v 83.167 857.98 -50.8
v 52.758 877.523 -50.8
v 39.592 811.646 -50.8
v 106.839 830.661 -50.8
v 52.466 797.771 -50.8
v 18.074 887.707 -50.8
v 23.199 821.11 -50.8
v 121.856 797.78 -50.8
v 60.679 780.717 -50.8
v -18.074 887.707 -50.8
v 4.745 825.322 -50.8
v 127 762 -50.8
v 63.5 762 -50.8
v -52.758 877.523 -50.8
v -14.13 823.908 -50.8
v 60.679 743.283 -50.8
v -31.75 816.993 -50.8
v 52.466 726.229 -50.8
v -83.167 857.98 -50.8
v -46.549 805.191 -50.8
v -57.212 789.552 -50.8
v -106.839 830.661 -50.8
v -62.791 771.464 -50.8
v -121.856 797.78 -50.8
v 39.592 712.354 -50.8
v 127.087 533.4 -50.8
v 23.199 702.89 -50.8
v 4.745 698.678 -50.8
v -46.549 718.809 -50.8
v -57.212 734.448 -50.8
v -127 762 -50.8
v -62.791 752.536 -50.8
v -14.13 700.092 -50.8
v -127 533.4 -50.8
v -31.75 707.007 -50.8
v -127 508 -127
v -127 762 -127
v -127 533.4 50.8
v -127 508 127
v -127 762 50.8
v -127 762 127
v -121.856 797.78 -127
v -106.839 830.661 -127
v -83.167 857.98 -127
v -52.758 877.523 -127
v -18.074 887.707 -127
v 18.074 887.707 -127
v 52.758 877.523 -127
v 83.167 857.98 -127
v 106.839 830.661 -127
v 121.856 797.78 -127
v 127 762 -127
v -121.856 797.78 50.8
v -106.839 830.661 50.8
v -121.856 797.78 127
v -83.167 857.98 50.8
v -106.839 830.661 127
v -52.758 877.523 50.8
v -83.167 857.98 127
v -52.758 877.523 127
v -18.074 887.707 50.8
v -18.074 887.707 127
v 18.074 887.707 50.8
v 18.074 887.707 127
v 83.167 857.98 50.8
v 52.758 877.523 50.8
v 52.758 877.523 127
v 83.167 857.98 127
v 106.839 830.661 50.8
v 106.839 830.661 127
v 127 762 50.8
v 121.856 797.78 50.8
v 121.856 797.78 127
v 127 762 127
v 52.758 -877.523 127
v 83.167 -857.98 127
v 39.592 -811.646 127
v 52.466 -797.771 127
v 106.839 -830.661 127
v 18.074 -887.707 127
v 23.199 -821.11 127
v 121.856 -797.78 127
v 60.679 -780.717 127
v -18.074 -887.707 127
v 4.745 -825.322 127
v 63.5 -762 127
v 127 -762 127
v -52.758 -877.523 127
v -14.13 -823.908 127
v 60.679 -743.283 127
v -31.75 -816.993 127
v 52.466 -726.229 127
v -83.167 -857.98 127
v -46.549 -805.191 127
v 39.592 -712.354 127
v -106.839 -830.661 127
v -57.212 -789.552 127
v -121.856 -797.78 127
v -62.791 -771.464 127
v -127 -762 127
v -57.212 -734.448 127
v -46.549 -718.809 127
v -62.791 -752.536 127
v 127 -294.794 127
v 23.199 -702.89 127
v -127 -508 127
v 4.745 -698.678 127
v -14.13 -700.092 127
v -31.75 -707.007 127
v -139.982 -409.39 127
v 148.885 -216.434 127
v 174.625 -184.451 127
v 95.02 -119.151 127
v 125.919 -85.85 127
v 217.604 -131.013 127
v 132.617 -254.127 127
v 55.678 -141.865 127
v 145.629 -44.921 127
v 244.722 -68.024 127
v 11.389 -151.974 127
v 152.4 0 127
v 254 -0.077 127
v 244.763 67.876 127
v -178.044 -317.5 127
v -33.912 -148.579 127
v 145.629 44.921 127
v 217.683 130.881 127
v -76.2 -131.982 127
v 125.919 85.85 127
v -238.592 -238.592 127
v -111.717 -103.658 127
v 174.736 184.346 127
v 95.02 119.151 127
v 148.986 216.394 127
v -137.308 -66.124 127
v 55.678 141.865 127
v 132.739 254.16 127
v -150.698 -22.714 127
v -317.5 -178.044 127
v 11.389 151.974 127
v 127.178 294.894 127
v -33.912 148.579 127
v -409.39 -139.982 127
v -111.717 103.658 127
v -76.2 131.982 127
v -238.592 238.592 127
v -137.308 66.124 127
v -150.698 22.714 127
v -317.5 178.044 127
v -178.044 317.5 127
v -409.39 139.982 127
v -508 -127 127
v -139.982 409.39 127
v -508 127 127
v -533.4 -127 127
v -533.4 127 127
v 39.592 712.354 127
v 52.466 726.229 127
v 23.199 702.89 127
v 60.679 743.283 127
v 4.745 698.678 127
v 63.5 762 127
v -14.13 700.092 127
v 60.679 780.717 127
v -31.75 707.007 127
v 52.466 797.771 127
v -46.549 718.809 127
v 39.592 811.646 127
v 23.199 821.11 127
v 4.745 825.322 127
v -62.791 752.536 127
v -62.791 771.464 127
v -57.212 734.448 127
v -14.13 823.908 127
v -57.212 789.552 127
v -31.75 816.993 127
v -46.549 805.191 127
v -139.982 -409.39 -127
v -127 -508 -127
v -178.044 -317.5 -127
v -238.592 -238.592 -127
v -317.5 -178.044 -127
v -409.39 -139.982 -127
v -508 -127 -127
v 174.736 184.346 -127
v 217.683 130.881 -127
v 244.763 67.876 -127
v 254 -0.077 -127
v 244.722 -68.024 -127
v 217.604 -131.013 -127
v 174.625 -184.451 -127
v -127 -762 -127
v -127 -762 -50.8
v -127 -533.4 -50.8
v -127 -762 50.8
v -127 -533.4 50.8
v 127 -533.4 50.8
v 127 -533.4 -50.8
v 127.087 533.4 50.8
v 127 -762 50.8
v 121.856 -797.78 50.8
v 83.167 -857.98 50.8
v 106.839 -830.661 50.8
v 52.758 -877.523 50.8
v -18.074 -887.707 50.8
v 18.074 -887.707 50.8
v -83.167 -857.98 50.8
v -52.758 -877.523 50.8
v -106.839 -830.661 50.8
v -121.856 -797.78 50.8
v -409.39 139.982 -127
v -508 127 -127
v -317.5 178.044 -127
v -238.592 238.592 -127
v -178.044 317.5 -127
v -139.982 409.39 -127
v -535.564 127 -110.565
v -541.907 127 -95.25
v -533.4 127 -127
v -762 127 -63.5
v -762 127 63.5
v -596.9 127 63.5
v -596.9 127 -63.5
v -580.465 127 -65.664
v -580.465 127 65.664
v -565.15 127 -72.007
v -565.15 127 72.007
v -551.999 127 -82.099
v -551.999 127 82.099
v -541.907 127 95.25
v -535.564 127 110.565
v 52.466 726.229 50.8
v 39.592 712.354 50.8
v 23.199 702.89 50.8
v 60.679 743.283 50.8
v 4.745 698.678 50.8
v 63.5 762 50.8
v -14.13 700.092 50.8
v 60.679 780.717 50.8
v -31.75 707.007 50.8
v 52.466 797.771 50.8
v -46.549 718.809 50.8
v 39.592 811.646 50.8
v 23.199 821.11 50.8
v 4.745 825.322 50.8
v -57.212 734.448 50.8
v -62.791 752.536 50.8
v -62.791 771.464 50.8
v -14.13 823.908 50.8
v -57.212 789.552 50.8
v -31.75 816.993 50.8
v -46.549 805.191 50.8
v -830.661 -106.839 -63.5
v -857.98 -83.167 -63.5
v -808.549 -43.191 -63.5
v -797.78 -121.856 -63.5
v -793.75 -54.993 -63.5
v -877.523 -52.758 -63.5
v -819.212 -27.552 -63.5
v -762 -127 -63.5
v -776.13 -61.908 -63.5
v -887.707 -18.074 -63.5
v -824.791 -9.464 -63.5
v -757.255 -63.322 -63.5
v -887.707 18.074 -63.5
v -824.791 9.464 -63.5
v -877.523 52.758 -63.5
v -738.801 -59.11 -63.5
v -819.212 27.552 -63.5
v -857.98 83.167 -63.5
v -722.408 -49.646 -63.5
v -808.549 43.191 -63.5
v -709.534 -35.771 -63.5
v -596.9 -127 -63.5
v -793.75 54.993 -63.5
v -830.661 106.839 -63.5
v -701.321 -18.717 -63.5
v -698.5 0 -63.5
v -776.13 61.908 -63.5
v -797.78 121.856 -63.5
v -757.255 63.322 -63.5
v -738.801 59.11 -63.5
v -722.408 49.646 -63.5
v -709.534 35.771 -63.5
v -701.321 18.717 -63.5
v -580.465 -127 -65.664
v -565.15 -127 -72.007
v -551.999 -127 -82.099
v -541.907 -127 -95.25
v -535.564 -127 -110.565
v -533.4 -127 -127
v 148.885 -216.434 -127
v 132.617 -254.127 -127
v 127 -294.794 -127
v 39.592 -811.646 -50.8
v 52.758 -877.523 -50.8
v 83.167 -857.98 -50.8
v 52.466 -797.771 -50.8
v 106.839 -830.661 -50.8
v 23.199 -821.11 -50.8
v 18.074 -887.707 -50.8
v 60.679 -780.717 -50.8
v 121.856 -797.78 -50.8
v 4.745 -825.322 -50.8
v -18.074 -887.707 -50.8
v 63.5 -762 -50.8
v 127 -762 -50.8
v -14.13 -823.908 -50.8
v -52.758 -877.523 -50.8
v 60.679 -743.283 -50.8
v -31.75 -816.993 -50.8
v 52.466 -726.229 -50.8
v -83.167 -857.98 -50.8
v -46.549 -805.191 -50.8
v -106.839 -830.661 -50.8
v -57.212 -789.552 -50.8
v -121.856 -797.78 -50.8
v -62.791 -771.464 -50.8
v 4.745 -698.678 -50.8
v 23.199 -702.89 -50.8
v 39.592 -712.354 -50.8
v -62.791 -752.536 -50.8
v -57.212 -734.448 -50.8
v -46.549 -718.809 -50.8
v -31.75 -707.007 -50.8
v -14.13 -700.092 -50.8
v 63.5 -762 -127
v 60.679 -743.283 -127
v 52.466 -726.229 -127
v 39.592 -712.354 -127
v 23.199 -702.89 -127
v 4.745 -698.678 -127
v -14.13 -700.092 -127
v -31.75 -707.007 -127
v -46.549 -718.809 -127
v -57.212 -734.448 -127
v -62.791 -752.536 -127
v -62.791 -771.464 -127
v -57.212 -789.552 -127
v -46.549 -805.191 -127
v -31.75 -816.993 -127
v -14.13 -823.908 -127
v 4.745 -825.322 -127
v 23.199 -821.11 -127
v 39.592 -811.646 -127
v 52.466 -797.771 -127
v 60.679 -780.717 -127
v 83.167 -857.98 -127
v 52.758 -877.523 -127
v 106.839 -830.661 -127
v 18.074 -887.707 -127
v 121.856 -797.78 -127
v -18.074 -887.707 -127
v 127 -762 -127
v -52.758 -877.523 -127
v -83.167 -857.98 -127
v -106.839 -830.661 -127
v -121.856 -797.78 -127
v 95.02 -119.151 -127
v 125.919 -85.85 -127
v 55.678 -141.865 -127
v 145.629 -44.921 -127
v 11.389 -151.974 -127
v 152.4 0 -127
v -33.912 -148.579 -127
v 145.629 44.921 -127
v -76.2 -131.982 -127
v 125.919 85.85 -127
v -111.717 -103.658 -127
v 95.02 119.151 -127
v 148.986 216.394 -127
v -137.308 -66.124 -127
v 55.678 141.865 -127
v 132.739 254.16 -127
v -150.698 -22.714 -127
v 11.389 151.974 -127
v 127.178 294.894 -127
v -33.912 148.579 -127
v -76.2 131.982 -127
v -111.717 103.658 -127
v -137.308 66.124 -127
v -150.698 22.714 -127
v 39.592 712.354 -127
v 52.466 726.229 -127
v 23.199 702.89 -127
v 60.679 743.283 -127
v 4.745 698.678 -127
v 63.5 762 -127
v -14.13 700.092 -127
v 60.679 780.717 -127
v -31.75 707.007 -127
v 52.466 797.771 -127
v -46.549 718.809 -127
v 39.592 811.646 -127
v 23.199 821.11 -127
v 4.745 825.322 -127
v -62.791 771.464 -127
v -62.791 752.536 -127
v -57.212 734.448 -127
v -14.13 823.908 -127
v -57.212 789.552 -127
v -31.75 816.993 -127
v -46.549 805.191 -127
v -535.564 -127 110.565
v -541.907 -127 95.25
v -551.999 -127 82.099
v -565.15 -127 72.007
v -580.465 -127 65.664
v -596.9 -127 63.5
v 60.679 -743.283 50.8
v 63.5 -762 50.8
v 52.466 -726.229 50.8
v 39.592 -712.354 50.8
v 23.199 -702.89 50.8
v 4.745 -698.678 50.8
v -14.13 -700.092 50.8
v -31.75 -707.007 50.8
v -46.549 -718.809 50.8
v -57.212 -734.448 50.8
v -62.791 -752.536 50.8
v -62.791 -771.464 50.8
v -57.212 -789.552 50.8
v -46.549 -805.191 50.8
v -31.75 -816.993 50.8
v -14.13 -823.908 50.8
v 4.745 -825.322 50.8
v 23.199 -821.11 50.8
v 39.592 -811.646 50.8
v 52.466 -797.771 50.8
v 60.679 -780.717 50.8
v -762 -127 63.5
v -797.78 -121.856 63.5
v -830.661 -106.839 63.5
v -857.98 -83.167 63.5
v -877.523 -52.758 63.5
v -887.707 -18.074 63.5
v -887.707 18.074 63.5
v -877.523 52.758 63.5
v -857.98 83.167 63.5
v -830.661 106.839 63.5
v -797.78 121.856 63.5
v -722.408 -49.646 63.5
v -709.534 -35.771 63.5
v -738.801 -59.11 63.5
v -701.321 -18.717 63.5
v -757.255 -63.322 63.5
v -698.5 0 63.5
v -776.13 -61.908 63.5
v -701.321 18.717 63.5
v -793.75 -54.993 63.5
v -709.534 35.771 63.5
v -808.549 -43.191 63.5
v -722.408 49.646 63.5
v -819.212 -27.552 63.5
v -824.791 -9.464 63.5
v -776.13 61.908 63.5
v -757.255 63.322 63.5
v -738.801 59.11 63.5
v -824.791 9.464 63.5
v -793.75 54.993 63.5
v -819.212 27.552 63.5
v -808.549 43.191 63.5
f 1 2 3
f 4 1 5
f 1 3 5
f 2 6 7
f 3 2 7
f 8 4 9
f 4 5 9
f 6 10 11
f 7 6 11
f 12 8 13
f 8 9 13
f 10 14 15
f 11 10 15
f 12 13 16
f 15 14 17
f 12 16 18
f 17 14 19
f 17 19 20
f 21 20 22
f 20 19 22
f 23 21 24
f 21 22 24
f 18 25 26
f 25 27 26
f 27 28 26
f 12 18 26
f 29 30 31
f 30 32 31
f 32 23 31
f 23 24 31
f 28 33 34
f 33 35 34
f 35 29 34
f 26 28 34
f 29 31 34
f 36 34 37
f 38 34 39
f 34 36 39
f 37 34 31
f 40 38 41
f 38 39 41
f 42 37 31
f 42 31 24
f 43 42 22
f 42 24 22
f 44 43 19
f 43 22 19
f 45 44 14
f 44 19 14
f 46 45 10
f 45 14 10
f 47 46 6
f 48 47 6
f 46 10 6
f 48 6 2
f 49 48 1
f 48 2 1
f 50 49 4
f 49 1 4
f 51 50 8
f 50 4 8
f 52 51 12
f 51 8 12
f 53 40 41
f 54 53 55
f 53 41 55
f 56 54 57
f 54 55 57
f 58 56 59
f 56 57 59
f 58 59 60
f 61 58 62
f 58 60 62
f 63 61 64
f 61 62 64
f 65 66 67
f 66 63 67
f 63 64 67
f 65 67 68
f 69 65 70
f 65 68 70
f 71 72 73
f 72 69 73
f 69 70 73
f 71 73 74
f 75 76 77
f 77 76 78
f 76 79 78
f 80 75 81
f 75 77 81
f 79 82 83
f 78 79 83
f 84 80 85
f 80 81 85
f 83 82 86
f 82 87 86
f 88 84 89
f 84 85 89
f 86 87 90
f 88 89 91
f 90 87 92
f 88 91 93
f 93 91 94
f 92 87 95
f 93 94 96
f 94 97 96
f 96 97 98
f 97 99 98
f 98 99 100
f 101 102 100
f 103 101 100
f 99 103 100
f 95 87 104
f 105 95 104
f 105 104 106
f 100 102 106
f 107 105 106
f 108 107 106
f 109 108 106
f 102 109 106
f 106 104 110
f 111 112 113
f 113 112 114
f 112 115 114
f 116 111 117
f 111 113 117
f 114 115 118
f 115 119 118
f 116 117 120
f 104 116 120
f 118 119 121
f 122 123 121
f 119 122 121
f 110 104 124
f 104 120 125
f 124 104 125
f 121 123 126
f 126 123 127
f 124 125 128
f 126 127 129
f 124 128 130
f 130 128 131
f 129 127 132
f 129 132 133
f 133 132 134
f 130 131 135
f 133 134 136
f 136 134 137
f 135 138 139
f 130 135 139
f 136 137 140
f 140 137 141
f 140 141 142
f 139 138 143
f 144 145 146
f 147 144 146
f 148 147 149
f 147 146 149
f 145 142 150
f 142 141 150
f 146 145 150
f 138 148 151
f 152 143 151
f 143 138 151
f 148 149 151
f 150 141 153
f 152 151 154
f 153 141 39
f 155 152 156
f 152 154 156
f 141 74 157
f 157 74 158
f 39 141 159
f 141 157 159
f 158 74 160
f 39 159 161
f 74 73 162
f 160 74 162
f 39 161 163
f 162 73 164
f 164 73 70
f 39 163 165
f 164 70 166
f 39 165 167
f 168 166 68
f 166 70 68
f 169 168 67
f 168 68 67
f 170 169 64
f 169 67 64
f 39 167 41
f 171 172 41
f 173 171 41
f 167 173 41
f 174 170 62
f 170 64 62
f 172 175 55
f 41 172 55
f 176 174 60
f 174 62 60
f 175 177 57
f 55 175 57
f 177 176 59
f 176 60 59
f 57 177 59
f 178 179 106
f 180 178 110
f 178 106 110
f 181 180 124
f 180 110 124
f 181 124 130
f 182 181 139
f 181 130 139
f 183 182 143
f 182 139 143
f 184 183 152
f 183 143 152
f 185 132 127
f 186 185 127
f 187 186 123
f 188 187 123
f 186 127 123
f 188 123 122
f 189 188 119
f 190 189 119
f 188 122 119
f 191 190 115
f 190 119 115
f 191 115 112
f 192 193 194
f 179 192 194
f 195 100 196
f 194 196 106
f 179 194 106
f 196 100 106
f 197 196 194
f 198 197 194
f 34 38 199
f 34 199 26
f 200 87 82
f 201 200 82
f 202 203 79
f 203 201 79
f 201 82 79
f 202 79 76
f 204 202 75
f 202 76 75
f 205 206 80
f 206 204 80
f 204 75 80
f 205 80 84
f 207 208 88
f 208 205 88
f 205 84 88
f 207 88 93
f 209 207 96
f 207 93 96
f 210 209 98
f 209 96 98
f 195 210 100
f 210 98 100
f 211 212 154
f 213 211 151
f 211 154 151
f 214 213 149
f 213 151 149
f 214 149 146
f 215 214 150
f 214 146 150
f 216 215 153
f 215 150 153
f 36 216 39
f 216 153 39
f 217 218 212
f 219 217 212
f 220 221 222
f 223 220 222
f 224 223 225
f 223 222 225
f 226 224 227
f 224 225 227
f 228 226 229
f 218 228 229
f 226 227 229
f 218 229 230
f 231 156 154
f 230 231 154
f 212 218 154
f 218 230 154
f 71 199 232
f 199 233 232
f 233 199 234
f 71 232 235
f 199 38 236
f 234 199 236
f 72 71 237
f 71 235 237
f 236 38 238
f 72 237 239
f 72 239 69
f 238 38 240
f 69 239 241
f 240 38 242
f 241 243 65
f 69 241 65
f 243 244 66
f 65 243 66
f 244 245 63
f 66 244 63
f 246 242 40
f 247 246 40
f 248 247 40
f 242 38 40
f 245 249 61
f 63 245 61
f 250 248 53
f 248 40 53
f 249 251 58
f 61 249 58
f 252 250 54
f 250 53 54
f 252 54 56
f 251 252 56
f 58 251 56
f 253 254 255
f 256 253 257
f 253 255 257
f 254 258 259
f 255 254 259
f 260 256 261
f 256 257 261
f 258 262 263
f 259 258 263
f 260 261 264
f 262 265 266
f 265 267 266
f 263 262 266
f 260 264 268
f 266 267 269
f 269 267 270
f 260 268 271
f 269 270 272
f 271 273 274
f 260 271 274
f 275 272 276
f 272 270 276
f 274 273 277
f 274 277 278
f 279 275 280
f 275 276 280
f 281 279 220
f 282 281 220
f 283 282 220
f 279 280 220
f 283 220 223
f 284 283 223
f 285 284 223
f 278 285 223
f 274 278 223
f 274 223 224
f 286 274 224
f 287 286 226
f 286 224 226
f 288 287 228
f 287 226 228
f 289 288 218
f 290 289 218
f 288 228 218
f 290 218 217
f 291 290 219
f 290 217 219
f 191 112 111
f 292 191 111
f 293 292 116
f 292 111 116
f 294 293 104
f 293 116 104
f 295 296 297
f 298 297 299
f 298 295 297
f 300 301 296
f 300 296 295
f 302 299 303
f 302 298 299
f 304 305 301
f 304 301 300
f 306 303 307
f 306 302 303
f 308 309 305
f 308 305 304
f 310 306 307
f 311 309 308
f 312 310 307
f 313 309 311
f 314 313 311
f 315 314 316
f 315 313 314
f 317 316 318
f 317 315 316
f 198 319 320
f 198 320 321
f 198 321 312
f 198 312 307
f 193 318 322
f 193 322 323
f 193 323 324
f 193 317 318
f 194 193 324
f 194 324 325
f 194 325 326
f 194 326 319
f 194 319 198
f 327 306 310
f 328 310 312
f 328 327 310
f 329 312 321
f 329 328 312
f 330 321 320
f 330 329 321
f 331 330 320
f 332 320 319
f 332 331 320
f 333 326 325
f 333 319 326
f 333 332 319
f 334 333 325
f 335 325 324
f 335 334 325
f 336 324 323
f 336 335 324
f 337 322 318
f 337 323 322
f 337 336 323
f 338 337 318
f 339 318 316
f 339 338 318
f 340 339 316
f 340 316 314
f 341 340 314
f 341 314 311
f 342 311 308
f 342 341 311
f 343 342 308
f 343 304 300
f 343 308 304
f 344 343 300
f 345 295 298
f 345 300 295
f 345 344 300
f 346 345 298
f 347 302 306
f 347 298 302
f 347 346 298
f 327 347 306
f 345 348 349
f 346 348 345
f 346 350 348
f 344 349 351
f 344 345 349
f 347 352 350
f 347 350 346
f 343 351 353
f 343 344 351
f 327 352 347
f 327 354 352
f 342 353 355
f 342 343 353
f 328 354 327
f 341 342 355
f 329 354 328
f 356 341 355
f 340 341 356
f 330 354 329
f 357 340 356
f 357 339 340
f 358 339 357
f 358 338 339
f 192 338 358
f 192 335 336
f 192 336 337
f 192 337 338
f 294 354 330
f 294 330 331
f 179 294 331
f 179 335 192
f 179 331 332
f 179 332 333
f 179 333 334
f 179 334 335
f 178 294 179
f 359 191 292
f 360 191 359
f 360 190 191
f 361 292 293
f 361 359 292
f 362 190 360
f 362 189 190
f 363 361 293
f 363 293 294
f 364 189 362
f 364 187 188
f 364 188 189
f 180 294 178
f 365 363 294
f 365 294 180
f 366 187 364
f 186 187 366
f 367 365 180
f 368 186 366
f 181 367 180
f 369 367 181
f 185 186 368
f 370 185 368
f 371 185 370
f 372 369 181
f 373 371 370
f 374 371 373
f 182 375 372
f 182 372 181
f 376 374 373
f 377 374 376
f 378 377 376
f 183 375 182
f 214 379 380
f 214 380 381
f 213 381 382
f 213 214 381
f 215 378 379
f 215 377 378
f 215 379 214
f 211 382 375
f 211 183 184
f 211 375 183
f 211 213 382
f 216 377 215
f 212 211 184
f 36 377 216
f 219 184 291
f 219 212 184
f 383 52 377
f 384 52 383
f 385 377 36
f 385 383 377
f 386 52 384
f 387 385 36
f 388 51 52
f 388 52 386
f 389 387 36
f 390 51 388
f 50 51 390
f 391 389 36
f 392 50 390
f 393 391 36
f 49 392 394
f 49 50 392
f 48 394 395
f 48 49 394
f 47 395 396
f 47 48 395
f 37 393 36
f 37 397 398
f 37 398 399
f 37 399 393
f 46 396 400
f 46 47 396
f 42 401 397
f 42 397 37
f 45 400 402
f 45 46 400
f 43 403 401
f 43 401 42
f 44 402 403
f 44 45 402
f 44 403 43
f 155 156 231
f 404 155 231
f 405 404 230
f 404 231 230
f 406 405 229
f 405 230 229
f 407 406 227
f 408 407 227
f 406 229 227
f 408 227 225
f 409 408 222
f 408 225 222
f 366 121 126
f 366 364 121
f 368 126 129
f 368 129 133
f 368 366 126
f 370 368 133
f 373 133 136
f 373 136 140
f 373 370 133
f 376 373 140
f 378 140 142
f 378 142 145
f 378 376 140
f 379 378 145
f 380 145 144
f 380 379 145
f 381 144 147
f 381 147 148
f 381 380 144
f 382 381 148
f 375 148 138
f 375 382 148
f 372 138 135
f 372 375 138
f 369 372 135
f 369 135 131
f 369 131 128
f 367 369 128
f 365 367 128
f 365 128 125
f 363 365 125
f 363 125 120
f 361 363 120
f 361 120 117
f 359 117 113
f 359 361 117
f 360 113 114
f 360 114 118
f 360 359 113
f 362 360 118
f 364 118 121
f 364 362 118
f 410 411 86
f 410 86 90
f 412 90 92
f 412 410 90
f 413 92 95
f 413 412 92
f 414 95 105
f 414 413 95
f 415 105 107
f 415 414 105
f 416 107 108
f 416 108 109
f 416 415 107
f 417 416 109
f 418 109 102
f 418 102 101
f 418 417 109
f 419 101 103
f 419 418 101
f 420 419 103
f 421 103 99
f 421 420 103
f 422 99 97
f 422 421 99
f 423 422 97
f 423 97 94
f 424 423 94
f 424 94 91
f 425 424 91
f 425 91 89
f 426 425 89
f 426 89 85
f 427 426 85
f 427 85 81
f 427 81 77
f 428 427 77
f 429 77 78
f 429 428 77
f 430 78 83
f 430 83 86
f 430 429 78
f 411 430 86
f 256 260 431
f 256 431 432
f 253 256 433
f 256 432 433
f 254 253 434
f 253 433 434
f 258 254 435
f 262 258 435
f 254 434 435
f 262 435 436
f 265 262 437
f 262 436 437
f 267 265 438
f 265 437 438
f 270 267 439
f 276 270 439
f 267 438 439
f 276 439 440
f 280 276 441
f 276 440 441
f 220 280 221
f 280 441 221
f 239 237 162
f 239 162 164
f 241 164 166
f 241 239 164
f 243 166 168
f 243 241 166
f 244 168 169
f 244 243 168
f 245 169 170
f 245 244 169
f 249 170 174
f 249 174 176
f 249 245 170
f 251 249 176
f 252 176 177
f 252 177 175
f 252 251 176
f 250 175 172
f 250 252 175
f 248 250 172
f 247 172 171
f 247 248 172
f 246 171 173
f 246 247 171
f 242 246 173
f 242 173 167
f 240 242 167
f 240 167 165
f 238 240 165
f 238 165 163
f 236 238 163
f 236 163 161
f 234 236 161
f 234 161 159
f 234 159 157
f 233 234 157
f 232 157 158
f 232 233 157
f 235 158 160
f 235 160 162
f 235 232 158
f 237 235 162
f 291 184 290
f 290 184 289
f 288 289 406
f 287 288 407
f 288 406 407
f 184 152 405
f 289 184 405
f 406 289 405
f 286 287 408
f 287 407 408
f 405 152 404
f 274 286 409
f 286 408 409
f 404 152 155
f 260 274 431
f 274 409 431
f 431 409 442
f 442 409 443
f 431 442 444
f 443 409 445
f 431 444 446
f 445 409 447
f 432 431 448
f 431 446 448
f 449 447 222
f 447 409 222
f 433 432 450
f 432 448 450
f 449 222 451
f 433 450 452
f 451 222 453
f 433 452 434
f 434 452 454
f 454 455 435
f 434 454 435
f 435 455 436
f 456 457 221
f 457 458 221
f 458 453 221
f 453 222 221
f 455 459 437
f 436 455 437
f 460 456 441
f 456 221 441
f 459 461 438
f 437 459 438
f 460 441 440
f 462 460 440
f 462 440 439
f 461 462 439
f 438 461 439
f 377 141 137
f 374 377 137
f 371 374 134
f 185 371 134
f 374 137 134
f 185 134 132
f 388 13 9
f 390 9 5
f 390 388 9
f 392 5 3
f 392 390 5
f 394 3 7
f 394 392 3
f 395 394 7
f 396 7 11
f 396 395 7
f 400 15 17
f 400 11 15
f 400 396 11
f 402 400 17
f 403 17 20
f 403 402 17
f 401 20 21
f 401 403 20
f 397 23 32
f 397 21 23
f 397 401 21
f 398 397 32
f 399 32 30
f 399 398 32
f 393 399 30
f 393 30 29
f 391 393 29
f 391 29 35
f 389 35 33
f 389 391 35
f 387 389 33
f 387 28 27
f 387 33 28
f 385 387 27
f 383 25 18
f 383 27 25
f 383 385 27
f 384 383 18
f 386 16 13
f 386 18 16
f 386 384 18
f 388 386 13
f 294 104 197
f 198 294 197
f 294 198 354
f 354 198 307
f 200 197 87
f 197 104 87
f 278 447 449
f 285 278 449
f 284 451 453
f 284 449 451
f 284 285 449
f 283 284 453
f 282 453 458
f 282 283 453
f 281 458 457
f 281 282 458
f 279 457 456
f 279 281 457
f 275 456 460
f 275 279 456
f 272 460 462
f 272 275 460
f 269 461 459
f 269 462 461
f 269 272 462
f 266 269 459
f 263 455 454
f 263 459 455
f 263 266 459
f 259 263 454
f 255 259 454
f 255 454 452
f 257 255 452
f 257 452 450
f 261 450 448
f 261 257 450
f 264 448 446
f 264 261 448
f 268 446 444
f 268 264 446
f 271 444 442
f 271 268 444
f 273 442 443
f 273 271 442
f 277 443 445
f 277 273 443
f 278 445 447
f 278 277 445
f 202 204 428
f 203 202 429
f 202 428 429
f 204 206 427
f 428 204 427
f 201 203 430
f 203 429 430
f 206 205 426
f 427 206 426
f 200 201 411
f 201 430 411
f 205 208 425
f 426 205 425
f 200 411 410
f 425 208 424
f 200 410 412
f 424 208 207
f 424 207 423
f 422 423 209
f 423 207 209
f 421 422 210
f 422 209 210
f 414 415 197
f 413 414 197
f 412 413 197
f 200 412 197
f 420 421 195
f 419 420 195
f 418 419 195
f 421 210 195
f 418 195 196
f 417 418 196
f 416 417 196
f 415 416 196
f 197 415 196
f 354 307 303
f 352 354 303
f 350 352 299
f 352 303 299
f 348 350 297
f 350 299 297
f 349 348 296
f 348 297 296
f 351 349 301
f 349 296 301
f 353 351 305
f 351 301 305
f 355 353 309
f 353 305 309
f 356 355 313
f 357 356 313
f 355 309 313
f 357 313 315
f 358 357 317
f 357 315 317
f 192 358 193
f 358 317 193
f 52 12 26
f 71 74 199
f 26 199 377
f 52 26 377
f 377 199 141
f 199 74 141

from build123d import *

# Parameters (mm, degrees)
SKETCH1_R               = 63.5
SKETCH1_R_2             = 152.4
BOSS_EXTRUDE1_DEPTH     = 127
CUT_EXTRUDE1_DEPTH      = 1264.634045125
CUT_EXTRUDE1_DEPTH_BACK = 1264.634045125
SKETCH2_W               = 101.6
SKETCH2_H               = 355.6
CUT_EXTRUDE2_DEPTH      = 254


with BuildPart() as part:
    # Sketch1 → Boss-Extrude1 (new, symmetric)
    with BuildSketch(Plane.XY):
        with BuildLine():
            Line((127, -294.794488402), (127, -762))
            ThreePointArc((127, -762), (0, -889), (-127, -762))
            Line((-127, -762), (-127, -508))
            ThreePointArc((-127, -508), (-238.592316368, -238.592316368), (-508, -127))
            Line((-508, -127), (-762, -127))
            ThreePointArc((-762, -127), (-889, 0), (-762, 127))
            Line((-762, 127), (-508, 127))
            ThreePointArc((-508, 127), (-238.592316368, 238.592316368), (-127, 508))
            Line((-127, 508), (-127, 762))
            ThreePointArc((-127, 762), (0, 889), (127, 762))
            Line((127, 762), (127.177644281, 294.893747175))
            ThreePointArc((127.177644281, 294.893747175), (139.582882613, 234.726570772), (174.736020462, 184.345662149))
            ThreePointArc((174.736020462, 184.345662149), (253.999988445, -0.076613885), (174.624780504, -184.451039666))
            ThreePointArc((174.624780504, -184.451039666), (139.476090274, -234.729960661), (127, -294.794488402))
        make_face()
        with Locations((0, 762)):
            Circle(SKETCH1_R, mode=Mode.SUBTRACT)
        with Locations((0, -762)):
            Circle(SKETCH1_R, mode=Mode.SUBTRACT)
        with Locations((-762, 0)):
            Circle(SKETCH1_R, mode=Mode.SUBTRACT)
        Circle(SKETCH1_R_2, mode=Mode.SUBTRACT)
    extrude(amount=BOSS_EXTRUDE1_DEPTH, both=True)

    # Sketch2 → Cut-Extrude1 (cut, two sides: drawn at the far end of the back side and taken through both)
    with BuildSketch(Plane(origin=(0, 0, 0), x_dir=(0, 0, -1), z_dir=(1, 0, 0)).offset(-CUT_EXTRUDE1_DEPTH_BACK)):
        Polygon((-50.8, 889), (50.8, 889), (50.8, 533.4), (0, 533.4), (-50.8, 533.4), align=None)
        with Locations((0, -711.2)):
            Rectangle(SKETCH2_W, SKETCH2_H)
    extrude(amount=CUT_EXTRUDE1_DEPTH + CUT_EXTRUDE1_DEPTH_BACK, mode=Mode.SUBTRACT)

    # Sketch3 → Cut-Extrude2 (cut)
    with BuildSketch(Plane(origin=(0, 127, 0), x_dir=(1, 0, 0), z_dir=(0, 1, 0))):
        with BuildLine():
            Line((-762, 127), (-762, 63.5))
            Line((-762, 63.5), (-596.9, 63.5))
            ThreePointArc((-596.9, 63.5), (-551.998719395, 82.098719395), (-533.4, 127))
            Line((-533.4, 127), (-762, 127))
        make_face()
        Polygon((-889, 63.5), (-762, 63.5), (-762, 127), (-533.4, 127), (-533.4, 247.034120233), (-889, 247.034120233), align=None)
        Polygon((-762, -127), (-762, -63.5), (-889, -63.5), (-889, -178.364595134), (-533.4, -178.364595134), (-533.4, -127), align=None)
        with BuildLine():
            ThreePointArc((-533.4, -127), (-551.998719395, -82.098719395), (-596.9, -63.5))
            Line((-596.9, -63.5), (-762, -63.5))
            Line((-762, -63.5), (-762, -127))
            Line((-762, -127), (-533.4, -127))
        make_face()
    extrude(amount=-CUT_EXTRUDE2_DEPTH, mode=Mode.SUBTRACT)


solid = part.part
